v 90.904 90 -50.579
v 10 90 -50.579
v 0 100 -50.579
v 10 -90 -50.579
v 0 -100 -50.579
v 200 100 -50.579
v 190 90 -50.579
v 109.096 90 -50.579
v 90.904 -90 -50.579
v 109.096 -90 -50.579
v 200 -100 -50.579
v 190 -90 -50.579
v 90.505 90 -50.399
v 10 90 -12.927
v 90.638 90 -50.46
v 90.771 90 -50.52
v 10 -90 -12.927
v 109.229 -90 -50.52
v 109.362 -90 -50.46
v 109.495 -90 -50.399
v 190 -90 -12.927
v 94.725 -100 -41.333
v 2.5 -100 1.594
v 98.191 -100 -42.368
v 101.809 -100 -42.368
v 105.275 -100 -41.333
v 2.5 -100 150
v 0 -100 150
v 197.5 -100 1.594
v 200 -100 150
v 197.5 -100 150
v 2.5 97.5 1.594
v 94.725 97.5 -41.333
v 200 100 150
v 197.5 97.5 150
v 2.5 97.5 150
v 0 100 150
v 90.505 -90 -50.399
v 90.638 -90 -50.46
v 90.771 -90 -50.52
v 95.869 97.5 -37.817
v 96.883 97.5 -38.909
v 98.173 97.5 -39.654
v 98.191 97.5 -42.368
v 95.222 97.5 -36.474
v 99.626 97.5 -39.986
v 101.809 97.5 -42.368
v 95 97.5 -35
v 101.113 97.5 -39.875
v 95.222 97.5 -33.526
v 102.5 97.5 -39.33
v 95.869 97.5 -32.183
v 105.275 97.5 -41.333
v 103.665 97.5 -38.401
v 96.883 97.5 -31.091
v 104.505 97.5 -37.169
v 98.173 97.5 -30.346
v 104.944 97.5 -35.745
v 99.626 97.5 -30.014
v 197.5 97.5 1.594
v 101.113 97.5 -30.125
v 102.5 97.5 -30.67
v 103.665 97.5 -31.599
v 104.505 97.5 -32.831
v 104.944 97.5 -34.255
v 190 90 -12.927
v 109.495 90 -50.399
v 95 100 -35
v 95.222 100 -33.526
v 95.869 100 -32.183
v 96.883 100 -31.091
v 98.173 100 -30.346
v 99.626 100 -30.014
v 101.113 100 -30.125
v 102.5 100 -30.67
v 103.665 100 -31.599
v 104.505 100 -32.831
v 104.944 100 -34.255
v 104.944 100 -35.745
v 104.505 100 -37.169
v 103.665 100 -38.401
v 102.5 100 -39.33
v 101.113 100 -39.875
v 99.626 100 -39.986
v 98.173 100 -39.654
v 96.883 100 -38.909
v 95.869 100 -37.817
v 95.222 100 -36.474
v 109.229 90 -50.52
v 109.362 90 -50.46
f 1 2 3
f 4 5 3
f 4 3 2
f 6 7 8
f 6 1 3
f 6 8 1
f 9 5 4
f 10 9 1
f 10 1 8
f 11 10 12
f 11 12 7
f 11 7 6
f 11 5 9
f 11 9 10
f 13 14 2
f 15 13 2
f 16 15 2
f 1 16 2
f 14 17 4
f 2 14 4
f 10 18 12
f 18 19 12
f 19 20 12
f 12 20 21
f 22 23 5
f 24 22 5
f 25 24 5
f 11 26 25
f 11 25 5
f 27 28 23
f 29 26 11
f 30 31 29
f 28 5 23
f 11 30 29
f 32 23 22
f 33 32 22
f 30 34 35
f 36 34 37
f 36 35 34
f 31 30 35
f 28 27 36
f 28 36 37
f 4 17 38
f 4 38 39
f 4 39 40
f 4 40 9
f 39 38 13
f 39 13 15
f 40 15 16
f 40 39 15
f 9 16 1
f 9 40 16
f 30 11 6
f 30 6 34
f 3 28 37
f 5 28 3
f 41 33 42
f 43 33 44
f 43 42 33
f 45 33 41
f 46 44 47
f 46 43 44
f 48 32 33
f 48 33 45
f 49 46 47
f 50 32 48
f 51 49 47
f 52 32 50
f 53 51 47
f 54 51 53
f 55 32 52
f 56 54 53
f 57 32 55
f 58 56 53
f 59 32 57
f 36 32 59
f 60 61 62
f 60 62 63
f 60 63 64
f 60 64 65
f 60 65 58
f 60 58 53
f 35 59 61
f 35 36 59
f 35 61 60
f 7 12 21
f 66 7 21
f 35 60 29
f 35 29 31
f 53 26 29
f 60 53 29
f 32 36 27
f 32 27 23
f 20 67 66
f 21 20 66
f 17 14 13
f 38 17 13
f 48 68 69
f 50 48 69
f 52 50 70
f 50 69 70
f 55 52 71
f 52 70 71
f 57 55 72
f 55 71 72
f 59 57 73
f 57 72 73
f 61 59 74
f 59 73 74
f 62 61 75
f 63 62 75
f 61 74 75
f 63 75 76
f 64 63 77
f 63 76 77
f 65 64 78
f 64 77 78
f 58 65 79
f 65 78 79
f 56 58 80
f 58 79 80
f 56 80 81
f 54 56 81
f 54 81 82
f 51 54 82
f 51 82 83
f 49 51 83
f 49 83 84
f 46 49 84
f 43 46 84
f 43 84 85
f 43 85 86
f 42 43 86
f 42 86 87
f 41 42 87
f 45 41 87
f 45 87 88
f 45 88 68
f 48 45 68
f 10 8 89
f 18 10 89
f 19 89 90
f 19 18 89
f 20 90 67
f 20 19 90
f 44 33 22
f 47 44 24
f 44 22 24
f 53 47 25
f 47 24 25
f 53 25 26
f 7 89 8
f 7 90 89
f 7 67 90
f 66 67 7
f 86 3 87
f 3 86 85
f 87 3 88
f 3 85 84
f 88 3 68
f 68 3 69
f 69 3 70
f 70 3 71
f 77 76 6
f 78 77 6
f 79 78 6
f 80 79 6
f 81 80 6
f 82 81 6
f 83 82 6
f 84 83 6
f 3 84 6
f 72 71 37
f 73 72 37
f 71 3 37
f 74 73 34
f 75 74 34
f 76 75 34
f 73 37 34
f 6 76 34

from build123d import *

# Parameters (mm, degrees)
F1_DEPTH     = 100
F2_T         = -2.5
F3_R         = 5
F4_DEPTH     = 200.001
F6_DEPTH     = 200
F7_T         = 10
F7_T3_DEPTH  = 168.4060893131
F7_T5_DEPTH  = 121.7259809119
F7_T7_DEPTH  = 121.7259809119
F7_T9_DEPTH  = 217.5
F7_T12_ANGLE = 49.9194838504


# Not quite as in the source:
# - a shell that OpenCascade refuses in one call is made with other operations: the cavity is built on its own and cut out


with BuildPart() as f1:
    # F0 (on Front) → F1 (new body, symmetric)
    with BuildSketch(Plane.XZ):
        with BuildLine():
            Line((200, 150), (0, 150))
            Line((0, 150), (0, 0))
            Line((0, 0), (93.6702797046, -43.5990676512))
            ThreePointArc((93.6702797046, -43.5990676512), (91.9360618935, -17.3519605387), (115, -30))
            ThreePointArc((115, -30), (112.6480394613, -38.0639381065), (106.3297202954, -43.5990676512))
            Line((106.3297202954, -43.5990676512), (200, 0))
            Line((200, 0), (200, 150))
        make_face()
        with BuildLine():
            ThreePointArc((115, -30), (91.9360618935, -17.3519605387), (93.6702797046, -43.5990676512))
            ThreePointArc((93.6702797046, -43.5990676512), (100, -45), (106.3297202954, -43.5990676512))
            ThreePointArc((106.3297202954, -43.5990676512), (112.6480394613, -38.0639381065), (115, -30))
        make_face()
    extrude(amount=F1_DEPTH, both=True)

    # F2
    f2_openings = [f1.faces().sort_by_distance(p)[0] for p in [
        (100, -100, 62.86367),
        (100, 0, 150),
    ]]
    offset(amount=F2_T, openings=f2_openings)

    # F3 (on face) → F4 (cut, through all)
    with BuildSketch(Plane(origin=(0, 100, 0), x_dir=(-1, 0, 0), z_dir=(0, 1, 0))):
        with Locations((-100, -35)):
            Circle(F3_R)
    extrude(amount=-F4_DEPTH, mode=Mode.SUBTRACT)

    # F5 (on face) → F6 (join)
    with BuildSketch(Plane.XZ.offset(100)):
        with BuildLine():
            Line((93.6702797046, -43.5990676512), (0, 0))
            Line((0, 0), (0, -50.5793318152))
            Line((0, -50.5793318152), (200, -50.5793318152))
            Line((200, -50.5793318152), (200, 0))
            Line((200, 0), (106.3297202954, -43.5990676512))
            ThreePointArc((106.3297202954, -43.5990676512), (103.2414491537, -44.64557979), (100, -45))
            ThreePointArc((100, -45), (96.7585508463, -44.64557979), (93.6702797046, -43.5990676512))
        make_face()
    extrude(amount=-F6_DEPTH)

    # F7: shell of thickness 10, made by hand


with BuildPart() as f7_core1:
    # F7_t2: copy of F1
    add(f1.part)

    # the walls: a layer under each face that stays
    f7_faces = [f7_core1.faces().sort_by_distance(p)[0] for p in [
        (200, 0, 49.7103340924),
        (100, 100, 49.7103340924),
        (105, 98.75, -35),
        (100, 97.5, 53.75),
        (100, -1.25, -42.5),
        (48.6126165436, -1.25, -19.8693228445),
        (151.3873834564, -1.25, -19.8693228445),
        (2.5, -1.25, 75.7969553435),
        (197.5, -1.25, 75.7969553435),
        (0, 0, 49.7103340924),
        (33.3333333333, -100, -17.1494431794),
        (31.25, 97.5308641975, 150),
    ]]
    thicken(f7_faces, amount=-F7_T, mode=Mode.SUBTRACT)

    # F7_s4 → F7_t3 (cut)
    with BuildSketch(Plane.XY.offset(-8.4060893131)):
        Polygon((197.4, 97.4), (197.5, 107.5), (207.5, 107.5), (207.5, 97.5), align=None)
        Polygon((2.6, 97.4), (2.5, 107.5), (-7.5, 107.5), (-7.5, 97.5), align=None)
    extrude(amount=F7_T3_DEPTH, mode=Mode.SUBTRACT)

    # F7_s6 → F7_t5 (cut)
    with BuildSketch(Plane(origin=(61.6500227345, 0, 28.695158383), x_dir=(0, 1, 0), z_dir=(0.9066045101, 0, 0.421981353))):
        Polygon((97.4, -81.7962706049), (107.5, -81.8962706049), (107.5, -91.8962706049), (97.5, -91.8962706049), align=None)
    extrude(amount=F7_T5_DEPTH, mode=Mode.SUBTRACT)

    # F7_s8 → F7_t7 (cut)
    with BuildSketch(Plane(origin=(-7.6209984834, 0, 3.547212942), x_dir=(0, 1, 0), z_dir=(0.9066045101, 0, -0.421981353))):
        Polygon((97.4, 2.6), (107.5, 2.5), (107.5, -7.5), (97.5, -7.5), align=None)
    extrude(amount=F7_T7_DEPTH, mode=Mode.SUBTRACT)

    # F7_s10 → F7_t9 (cut)
    with BuildSketch(Plane.XZ.offset(-107.5)):
        Polygon((2.6421981353, 1.6845711379), (-1.7198135302, -7.4721344139), (-7.5, -4.7817320608), (-7.5, 1.5939106869), align=None)
        Polygon((197.3578018647, 1.6845711379), (201.7198135302, -7.4721344139), (207.5, -4.7817320608), (207.5, 1.5939106869), align=None)
    extrude(amount=F7_T9_DEPTH, mode=Mode.SUBTRACT)

    # F7_s11 → F7_t12 (revolve, cut)
    with BuildSketch(Plane(origin=(93.6702797046, 0, -43.5990676512), x_dir=(0, 1, 0), z_dir=(-0.9066045101, 0, 0.421981353))):
        Polygon((97.4, -2.6), (107.5, -2.5), (107.5, 7.5), (97.5, 7.5), align=None)
    revolve(axis=Axis((100, 97.5, -30), (0, -1, 0)), revolution_arc=F7_T12_ANGLE, mode=Mode.SUBTRACT)


with BuildPart() as f1_1:
    add(f1.part)

    # what is left inside the walls is the cavity
    f7_cavity = [f7_core1.part.solids().sort_by_distance(p)[0] for p in [
        (149.789488, 30, -31.753537),
        (50.210512, 30, -31.753537),
    ]]
    add(f7_cavity, mode=Mode.SUBTRACT)


solid = f1_1.part
